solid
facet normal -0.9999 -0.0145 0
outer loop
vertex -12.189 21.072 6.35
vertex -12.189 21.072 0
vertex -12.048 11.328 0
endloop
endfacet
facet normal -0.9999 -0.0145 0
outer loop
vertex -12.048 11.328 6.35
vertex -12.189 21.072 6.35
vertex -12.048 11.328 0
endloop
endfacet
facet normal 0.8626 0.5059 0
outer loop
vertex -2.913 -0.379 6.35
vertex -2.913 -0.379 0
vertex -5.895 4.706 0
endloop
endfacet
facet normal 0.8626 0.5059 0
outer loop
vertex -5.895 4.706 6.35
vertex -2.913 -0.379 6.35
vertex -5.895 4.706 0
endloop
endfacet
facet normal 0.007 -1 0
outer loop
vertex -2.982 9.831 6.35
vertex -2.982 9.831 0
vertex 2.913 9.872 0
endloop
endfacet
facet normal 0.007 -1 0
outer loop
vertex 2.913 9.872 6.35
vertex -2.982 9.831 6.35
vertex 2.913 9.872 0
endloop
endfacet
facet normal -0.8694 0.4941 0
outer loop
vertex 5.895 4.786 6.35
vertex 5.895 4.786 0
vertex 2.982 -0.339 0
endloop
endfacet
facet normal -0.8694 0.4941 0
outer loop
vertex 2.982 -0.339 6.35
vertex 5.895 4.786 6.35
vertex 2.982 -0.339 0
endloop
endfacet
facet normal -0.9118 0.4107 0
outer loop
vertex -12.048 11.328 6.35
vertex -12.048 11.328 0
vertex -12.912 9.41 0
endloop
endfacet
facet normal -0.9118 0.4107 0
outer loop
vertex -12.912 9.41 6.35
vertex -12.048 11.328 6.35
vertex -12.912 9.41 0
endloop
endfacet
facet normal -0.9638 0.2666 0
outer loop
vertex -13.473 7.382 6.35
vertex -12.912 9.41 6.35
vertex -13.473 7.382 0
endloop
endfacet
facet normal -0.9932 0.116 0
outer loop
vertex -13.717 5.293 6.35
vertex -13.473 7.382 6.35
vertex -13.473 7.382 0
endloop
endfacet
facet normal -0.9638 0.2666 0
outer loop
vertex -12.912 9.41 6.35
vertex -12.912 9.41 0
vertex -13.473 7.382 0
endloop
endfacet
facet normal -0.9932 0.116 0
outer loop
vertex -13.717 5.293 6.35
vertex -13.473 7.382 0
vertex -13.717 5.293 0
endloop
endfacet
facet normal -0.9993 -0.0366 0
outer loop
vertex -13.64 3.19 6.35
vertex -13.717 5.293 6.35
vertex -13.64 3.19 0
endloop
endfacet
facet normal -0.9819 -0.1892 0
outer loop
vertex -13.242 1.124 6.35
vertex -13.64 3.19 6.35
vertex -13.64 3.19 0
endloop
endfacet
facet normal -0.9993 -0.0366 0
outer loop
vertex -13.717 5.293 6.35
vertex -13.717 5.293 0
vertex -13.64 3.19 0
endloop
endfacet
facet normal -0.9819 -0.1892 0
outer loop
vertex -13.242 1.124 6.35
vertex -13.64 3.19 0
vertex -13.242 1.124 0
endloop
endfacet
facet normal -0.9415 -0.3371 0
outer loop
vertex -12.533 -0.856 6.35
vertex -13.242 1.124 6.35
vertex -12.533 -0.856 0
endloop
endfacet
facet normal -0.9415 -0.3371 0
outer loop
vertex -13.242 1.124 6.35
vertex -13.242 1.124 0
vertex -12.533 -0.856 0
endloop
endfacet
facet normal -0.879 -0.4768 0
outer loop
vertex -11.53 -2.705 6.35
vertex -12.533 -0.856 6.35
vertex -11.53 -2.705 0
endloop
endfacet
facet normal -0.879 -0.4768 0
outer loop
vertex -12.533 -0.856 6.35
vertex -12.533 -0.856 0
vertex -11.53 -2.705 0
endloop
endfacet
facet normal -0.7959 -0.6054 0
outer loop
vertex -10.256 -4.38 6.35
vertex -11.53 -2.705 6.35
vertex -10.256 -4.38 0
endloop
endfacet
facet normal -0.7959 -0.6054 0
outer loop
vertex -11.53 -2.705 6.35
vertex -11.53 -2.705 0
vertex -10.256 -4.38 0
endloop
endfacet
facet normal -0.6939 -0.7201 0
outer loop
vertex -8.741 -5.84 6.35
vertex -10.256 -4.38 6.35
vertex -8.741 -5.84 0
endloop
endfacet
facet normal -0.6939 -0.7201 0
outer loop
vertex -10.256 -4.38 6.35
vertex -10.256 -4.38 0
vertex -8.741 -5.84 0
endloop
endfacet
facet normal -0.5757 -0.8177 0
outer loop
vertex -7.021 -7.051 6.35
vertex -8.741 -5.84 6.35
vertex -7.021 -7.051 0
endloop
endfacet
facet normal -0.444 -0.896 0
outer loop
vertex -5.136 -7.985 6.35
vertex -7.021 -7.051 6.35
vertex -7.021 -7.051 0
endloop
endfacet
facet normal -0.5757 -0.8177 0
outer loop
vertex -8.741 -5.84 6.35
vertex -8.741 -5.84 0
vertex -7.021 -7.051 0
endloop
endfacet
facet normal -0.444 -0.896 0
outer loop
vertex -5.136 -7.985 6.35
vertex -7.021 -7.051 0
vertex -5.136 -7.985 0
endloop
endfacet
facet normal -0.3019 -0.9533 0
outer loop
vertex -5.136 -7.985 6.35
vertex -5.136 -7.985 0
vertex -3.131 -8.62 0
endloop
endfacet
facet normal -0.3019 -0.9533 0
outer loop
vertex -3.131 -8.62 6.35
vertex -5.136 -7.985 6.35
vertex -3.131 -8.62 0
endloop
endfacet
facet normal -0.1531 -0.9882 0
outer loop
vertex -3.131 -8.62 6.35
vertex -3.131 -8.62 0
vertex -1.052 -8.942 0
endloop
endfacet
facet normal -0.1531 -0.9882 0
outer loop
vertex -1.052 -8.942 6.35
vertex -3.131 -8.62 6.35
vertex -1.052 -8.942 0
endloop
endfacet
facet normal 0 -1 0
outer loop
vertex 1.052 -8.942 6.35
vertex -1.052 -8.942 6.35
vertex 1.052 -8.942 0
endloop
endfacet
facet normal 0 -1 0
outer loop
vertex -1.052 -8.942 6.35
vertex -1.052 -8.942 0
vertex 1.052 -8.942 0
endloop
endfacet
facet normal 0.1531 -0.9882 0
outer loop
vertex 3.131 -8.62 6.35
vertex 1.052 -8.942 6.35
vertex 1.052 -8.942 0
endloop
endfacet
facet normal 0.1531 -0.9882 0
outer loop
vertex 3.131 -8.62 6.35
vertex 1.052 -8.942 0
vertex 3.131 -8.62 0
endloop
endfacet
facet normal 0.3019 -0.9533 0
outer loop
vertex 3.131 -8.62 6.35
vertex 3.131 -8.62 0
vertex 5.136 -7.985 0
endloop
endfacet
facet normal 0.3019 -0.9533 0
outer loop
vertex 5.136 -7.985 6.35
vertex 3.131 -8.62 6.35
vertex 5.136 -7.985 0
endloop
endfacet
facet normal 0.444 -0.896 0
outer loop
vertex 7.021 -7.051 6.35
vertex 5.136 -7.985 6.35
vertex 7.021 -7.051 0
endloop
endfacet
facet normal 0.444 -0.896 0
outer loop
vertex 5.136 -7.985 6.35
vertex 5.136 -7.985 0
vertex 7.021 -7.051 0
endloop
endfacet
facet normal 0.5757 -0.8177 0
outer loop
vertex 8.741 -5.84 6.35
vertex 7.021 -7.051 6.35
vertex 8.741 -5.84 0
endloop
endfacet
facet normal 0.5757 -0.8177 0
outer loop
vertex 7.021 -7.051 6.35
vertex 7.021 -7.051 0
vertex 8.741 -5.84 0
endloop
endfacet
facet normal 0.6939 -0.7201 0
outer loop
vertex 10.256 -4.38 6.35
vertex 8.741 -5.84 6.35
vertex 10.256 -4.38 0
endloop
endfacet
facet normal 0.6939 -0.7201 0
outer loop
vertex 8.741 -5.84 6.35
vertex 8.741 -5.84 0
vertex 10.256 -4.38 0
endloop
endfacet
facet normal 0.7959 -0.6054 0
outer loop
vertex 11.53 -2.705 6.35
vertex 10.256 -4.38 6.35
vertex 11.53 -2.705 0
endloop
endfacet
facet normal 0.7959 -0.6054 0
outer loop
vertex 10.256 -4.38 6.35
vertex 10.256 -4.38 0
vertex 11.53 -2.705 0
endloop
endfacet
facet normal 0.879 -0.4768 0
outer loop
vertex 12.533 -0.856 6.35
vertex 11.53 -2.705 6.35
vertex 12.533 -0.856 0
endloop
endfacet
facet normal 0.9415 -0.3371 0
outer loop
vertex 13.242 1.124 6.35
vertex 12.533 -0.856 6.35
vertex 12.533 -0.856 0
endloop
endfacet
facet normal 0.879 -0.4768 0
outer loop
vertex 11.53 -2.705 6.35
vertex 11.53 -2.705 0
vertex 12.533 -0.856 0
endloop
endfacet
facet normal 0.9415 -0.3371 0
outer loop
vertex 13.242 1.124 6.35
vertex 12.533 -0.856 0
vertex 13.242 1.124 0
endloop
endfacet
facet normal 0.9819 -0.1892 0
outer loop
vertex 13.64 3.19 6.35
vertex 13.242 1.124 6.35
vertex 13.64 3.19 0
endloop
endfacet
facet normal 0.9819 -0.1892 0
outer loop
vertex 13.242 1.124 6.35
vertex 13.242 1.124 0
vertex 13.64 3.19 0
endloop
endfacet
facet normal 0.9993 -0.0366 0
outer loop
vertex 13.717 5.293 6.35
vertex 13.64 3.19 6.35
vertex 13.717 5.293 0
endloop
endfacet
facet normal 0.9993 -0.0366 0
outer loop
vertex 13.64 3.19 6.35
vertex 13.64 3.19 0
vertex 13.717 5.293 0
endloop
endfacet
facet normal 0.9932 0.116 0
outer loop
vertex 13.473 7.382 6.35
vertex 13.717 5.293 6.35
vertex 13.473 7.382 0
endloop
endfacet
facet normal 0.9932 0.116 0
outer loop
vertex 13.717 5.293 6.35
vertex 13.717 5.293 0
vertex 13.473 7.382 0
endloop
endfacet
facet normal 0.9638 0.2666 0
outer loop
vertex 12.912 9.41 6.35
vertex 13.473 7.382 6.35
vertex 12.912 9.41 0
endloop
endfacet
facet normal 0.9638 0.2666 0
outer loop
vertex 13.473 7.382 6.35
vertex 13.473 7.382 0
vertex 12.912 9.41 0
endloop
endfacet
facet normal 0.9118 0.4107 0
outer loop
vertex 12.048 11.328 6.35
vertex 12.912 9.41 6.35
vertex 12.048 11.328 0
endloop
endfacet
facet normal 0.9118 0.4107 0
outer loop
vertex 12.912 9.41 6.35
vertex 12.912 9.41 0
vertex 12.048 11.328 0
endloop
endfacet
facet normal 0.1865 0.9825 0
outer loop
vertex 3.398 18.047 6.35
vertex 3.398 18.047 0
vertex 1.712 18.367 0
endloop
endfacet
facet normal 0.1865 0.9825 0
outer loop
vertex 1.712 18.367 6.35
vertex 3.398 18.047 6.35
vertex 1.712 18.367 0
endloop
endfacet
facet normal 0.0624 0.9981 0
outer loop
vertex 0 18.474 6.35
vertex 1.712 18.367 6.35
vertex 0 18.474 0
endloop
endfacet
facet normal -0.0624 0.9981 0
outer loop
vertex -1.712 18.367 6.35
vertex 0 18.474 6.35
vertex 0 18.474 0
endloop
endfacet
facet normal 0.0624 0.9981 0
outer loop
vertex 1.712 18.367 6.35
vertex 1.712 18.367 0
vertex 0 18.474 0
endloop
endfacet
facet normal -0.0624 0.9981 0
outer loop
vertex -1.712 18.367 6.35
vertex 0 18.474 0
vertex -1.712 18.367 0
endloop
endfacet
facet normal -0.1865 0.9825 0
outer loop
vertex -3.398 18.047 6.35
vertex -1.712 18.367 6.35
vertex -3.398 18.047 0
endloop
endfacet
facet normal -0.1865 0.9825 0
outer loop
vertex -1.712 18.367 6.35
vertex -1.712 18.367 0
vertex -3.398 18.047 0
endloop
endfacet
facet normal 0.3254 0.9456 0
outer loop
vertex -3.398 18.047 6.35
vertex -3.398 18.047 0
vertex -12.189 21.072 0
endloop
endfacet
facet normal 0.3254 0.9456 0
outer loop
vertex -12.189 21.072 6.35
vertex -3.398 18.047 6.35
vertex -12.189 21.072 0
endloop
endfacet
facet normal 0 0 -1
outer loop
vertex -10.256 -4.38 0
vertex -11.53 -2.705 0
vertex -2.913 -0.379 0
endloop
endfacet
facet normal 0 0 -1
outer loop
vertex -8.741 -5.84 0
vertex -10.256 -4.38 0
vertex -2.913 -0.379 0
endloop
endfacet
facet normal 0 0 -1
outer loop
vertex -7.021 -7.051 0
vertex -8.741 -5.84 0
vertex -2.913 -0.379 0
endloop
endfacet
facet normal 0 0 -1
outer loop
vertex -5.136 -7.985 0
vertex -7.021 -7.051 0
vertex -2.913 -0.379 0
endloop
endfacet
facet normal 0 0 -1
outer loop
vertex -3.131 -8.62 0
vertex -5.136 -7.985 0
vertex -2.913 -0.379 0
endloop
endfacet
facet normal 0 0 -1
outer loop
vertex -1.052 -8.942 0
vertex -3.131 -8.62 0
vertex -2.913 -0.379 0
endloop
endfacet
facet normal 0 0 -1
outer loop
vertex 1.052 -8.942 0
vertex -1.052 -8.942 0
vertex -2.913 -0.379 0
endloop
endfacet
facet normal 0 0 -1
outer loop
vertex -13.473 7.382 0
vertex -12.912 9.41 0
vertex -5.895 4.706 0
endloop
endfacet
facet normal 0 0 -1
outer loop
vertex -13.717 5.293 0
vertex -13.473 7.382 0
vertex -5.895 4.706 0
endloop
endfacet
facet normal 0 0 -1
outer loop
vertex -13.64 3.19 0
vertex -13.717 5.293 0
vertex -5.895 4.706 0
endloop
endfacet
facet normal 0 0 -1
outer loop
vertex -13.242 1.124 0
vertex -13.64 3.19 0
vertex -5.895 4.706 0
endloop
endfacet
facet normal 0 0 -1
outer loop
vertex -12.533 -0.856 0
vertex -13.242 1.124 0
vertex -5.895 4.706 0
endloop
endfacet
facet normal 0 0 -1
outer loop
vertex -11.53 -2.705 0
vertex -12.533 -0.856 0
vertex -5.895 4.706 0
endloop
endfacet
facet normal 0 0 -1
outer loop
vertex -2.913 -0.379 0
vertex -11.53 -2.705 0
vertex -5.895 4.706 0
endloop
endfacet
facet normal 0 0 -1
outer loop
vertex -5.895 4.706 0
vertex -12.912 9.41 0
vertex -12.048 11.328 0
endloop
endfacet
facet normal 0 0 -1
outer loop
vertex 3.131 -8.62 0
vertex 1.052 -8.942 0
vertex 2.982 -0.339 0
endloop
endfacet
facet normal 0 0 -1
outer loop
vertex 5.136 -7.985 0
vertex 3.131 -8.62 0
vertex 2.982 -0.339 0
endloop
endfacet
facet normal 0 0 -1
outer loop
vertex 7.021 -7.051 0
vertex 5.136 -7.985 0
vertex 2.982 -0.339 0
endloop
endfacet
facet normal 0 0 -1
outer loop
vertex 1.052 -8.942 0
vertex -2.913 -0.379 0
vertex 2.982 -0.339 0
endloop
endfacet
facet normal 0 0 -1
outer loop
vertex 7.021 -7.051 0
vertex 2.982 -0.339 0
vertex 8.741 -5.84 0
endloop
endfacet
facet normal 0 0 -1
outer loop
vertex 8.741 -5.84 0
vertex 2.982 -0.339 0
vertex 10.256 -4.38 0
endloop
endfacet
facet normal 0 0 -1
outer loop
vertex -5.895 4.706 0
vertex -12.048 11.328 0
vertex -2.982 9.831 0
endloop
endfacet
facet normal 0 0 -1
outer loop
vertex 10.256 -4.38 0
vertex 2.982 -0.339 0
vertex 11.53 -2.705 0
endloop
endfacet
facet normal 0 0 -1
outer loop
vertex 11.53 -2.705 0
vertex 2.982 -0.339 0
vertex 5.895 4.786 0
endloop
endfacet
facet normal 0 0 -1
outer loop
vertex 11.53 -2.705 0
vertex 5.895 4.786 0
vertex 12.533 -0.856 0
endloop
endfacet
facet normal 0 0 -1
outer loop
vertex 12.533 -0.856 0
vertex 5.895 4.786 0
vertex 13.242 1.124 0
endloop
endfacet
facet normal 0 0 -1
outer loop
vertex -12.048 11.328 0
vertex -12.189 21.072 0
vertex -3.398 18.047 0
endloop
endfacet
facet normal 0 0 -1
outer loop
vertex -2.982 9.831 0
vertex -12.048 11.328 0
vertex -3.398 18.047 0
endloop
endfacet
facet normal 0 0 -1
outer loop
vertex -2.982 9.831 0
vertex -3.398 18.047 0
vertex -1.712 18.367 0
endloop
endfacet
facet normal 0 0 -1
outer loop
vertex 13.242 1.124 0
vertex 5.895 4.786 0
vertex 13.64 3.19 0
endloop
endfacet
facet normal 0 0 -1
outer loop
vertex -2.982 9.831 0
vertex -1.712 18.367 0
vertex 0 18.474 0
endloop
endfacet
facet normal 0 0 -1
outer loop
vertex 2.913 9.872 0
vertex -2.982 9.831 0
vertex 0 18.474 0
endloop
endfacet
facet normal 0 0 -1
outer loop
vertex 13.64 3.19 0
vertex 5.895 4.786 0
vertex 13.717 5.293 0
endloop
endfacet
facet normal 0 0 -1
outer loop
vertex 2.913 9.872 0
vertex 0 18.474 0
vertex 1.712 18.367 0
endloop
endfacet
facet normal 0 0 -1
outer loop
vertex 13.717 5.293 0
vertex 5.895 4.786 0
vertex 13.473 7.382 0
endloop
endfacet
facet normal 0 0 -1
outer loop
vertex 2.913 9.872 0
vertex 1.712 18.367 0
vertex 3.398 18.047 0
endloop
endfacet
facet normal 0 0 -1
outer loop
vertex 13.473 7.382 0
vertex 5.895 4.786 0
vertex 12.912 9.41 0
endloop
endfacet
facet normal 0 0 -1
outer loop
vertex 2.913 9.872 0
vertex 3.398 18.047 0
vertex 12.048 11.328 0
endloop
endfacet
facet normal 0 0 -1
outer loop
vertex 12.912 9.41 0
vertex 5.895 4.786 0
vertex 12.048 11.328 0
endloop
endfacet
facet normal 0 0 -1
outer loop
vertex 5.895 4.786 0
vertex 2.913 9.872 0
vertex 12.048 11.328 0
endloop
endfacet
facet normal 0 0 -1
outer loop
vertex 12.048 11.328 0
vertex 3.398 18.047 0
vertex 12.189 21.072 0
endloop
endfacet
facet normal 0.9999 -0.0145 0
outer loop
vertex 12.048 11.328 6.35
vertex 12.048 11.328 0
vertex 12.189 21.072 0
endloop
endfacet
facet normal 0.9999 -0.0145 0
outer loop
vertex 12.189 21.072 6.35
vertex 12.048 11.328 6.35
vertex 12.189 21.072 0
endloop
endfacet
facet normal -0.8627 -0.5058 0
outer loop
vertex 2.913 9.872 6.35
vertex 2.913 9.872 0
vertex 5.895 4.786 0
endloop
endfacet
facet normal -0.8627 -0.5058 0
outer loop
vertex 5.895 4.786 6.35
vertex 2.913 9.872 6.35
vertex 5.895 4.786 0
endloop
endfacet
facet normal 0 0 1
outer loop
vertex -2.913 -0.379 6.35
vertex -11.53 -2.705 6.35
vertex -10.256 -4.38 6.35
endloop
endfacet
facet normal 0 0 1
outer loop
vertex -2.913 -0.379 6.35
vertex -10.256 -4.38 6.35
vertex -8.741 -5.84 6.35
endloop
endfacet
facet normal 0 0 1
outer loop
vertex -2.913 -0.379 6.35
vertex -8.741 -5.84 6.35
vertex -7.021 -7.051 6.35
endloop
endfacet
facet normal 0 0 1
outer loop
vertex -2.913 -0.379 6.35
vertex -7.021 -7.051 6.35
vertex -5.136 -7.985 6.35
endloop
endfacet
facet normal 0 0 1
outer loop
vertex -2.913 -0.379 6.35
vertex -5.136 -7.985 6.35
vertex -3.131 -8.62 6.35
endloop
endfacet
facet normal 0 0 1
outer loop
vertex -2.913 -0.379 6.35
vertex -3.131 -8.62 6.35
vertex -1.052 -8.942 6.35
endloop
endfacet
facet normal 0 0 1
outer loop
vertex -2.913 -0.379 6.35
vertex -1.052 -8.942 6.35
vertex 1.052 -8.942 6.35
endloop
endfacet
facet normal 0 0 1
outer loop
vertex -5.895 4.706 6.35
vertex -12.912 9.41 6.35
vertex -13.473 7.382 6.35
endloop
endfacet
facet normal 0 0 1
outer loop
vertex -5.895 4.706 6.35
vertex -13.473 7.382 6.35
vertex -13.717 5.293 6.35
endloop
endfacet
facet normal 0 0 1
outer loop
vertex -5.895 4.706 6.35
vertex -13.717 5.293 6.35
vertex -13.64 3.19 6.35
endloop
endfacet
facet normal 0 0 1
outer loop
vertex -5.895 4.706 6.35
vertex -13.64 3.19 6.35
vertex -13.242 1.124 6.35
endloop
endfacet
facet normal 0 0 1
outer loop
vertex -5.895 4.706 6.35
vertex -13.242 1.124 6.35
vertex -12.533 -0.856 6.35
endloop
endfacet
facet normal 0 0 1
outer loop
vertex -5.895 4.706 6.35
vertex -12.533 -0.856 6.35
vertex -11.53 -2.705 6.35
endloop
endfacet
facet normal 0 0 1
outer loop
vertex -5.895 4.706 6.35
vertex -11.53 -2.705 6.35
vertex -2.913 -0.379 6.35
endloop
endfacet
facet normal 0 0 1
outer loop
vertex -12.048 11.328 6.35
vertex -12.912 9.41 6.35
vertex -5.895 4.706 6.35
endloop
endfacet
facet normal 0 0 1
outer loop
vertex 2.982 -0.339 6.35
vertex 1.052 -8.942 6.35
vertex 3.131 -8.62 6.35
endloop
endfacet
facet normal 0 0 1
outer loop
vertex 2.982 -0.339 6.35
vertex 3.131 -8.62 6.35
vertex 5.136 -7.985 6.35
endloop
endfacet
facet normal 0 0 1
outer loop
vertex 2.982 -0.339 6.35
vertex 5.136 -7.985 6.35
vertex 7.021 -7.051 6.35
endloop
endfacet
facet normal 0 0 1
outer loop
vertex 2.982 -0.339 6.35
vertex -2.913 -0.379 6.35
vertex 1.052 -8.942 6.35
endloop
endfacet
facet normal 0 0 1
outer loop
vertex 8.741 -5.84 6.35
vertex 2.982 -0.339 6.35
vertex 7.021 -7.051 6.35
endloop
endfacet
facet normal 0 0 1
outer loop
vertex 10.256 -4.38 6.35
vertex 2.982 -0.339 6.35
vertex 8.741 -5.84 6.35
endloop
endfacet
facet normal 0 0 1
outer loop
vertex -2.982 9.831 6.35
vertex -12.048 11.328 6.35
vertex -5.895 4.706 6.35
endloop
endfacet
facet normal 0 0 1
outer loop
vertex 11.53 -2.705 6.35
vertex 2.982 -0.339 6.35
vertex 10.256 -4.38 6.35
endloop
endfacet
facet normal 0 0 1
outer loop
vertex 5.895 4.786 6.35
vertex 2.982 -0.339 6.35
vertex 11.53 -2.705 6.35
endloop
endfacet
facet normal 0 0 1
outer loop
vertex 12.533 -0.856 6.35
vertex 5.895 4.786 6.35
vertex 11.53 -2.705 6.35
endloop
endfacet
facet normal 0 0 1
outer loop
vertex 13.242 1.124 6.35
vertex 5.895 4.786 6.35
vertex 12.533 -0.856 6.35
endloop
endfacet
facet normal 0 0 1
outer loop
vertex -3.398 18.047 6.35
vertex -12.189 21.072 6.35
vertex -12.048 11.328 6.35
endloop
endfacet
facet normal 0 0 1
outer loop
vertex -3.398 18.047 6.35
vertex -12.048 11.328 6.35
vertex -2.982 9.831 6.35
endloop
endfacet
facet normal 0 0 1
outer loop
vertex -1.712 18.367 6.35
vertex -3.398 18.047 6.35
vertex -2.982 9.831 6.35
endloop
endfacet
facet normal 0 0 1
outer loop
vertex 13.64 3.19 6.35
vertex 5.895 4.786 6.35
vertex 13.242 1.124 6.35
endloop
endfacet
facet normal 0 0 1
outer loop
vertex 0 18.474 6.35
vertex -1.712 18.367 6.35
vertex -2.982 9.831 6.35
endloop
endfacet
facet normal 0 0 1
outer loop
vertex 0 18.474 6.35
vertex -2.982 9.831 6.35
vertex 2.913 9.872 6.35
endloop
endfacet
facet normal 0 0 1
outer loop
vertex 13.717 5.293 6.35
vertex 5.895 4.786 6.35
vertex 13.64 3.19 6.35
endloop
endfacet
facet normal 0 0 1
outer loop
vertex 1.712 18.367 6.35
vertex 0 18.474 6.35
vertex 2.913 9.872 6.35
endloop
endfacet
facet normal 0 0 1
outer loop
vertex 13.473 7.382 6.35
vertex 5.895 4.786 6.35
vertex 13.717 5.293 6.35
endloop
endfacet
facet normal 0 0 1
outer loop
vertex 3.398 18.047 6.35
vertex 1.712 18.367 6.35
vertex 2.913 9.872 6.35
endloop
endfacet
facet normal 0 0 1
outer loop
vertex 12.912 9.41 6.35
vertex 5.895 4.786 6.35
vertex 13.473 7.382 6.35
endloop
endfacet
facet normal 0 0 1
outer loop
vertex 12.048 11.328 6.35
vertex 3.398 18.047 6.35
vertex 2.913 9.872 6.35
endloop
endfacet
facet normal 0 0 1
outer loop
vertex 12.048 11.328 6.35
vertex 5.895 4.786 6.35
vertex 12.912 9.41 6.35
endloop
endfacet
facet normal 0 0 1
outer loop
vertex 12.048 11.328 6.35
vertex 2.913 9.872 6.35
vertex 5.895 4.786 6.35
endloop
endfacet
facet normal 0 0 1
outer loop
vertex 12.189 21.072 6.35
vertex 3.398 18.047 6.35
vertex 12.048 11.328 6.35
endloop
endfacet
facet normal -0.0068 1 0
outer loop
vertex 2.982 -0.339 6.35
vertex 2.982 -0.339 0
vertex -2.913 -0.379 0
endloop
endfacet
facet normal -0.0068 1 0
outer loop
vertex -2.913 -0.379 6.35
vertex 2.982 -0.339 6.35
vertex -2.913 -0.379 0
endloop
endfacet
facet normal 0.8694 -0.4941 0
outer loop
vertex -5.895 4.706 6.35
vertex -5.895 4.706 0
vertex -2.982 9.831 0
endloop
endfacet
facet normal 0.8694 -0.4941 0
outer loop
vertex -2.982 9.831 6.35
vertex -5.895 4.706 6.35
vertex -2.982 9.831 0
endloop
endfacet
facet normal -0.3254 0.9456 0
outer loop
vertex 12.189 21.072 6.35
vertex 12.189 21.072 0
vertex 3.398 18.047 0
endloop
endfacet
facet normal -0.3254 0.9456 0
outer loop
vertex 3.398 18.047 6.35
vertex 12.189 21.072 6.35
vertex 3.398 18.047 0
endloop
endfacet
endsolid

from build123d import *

# Parameters (mm, degrees)
F1_DEPTH = 6.35


with BuildPart() as f1:
    # F0 (on Top) → F1 (new body)
    with BuildSketch(Plane.XY):
        with BuildLine():
            Line((-12.188626, 21.072123), (-12.047861, 11.32767))
            ThreePointArc((-12.047861, 11.32767), (0, -8.98224), (12.047861, 11.32767))
            Line((12.047861, 11.32767), (12.188626, 21.072123))
            Line((12.188626, 21.072123), (3.397549, 18.047413))
            ThreePointArc((3.397549, 18.047413), (0, 18.474475), (-3.397549, 18.047413))
            Line((-3.397549, 18.047413), (-12.188626, 21.072123))
        make_face()
        Polygon((-2.982468, 9.831229), (2.912602, 9.871567), (5.89507, 4.786455), (2.982468, -0.338994), (-2.912602, -0.379331), (-5.89507, 4.70578), align=None, mode=Mode.SUBTRACT)
    extrude(amount=F1_DEPTH)


solid = f1.part
